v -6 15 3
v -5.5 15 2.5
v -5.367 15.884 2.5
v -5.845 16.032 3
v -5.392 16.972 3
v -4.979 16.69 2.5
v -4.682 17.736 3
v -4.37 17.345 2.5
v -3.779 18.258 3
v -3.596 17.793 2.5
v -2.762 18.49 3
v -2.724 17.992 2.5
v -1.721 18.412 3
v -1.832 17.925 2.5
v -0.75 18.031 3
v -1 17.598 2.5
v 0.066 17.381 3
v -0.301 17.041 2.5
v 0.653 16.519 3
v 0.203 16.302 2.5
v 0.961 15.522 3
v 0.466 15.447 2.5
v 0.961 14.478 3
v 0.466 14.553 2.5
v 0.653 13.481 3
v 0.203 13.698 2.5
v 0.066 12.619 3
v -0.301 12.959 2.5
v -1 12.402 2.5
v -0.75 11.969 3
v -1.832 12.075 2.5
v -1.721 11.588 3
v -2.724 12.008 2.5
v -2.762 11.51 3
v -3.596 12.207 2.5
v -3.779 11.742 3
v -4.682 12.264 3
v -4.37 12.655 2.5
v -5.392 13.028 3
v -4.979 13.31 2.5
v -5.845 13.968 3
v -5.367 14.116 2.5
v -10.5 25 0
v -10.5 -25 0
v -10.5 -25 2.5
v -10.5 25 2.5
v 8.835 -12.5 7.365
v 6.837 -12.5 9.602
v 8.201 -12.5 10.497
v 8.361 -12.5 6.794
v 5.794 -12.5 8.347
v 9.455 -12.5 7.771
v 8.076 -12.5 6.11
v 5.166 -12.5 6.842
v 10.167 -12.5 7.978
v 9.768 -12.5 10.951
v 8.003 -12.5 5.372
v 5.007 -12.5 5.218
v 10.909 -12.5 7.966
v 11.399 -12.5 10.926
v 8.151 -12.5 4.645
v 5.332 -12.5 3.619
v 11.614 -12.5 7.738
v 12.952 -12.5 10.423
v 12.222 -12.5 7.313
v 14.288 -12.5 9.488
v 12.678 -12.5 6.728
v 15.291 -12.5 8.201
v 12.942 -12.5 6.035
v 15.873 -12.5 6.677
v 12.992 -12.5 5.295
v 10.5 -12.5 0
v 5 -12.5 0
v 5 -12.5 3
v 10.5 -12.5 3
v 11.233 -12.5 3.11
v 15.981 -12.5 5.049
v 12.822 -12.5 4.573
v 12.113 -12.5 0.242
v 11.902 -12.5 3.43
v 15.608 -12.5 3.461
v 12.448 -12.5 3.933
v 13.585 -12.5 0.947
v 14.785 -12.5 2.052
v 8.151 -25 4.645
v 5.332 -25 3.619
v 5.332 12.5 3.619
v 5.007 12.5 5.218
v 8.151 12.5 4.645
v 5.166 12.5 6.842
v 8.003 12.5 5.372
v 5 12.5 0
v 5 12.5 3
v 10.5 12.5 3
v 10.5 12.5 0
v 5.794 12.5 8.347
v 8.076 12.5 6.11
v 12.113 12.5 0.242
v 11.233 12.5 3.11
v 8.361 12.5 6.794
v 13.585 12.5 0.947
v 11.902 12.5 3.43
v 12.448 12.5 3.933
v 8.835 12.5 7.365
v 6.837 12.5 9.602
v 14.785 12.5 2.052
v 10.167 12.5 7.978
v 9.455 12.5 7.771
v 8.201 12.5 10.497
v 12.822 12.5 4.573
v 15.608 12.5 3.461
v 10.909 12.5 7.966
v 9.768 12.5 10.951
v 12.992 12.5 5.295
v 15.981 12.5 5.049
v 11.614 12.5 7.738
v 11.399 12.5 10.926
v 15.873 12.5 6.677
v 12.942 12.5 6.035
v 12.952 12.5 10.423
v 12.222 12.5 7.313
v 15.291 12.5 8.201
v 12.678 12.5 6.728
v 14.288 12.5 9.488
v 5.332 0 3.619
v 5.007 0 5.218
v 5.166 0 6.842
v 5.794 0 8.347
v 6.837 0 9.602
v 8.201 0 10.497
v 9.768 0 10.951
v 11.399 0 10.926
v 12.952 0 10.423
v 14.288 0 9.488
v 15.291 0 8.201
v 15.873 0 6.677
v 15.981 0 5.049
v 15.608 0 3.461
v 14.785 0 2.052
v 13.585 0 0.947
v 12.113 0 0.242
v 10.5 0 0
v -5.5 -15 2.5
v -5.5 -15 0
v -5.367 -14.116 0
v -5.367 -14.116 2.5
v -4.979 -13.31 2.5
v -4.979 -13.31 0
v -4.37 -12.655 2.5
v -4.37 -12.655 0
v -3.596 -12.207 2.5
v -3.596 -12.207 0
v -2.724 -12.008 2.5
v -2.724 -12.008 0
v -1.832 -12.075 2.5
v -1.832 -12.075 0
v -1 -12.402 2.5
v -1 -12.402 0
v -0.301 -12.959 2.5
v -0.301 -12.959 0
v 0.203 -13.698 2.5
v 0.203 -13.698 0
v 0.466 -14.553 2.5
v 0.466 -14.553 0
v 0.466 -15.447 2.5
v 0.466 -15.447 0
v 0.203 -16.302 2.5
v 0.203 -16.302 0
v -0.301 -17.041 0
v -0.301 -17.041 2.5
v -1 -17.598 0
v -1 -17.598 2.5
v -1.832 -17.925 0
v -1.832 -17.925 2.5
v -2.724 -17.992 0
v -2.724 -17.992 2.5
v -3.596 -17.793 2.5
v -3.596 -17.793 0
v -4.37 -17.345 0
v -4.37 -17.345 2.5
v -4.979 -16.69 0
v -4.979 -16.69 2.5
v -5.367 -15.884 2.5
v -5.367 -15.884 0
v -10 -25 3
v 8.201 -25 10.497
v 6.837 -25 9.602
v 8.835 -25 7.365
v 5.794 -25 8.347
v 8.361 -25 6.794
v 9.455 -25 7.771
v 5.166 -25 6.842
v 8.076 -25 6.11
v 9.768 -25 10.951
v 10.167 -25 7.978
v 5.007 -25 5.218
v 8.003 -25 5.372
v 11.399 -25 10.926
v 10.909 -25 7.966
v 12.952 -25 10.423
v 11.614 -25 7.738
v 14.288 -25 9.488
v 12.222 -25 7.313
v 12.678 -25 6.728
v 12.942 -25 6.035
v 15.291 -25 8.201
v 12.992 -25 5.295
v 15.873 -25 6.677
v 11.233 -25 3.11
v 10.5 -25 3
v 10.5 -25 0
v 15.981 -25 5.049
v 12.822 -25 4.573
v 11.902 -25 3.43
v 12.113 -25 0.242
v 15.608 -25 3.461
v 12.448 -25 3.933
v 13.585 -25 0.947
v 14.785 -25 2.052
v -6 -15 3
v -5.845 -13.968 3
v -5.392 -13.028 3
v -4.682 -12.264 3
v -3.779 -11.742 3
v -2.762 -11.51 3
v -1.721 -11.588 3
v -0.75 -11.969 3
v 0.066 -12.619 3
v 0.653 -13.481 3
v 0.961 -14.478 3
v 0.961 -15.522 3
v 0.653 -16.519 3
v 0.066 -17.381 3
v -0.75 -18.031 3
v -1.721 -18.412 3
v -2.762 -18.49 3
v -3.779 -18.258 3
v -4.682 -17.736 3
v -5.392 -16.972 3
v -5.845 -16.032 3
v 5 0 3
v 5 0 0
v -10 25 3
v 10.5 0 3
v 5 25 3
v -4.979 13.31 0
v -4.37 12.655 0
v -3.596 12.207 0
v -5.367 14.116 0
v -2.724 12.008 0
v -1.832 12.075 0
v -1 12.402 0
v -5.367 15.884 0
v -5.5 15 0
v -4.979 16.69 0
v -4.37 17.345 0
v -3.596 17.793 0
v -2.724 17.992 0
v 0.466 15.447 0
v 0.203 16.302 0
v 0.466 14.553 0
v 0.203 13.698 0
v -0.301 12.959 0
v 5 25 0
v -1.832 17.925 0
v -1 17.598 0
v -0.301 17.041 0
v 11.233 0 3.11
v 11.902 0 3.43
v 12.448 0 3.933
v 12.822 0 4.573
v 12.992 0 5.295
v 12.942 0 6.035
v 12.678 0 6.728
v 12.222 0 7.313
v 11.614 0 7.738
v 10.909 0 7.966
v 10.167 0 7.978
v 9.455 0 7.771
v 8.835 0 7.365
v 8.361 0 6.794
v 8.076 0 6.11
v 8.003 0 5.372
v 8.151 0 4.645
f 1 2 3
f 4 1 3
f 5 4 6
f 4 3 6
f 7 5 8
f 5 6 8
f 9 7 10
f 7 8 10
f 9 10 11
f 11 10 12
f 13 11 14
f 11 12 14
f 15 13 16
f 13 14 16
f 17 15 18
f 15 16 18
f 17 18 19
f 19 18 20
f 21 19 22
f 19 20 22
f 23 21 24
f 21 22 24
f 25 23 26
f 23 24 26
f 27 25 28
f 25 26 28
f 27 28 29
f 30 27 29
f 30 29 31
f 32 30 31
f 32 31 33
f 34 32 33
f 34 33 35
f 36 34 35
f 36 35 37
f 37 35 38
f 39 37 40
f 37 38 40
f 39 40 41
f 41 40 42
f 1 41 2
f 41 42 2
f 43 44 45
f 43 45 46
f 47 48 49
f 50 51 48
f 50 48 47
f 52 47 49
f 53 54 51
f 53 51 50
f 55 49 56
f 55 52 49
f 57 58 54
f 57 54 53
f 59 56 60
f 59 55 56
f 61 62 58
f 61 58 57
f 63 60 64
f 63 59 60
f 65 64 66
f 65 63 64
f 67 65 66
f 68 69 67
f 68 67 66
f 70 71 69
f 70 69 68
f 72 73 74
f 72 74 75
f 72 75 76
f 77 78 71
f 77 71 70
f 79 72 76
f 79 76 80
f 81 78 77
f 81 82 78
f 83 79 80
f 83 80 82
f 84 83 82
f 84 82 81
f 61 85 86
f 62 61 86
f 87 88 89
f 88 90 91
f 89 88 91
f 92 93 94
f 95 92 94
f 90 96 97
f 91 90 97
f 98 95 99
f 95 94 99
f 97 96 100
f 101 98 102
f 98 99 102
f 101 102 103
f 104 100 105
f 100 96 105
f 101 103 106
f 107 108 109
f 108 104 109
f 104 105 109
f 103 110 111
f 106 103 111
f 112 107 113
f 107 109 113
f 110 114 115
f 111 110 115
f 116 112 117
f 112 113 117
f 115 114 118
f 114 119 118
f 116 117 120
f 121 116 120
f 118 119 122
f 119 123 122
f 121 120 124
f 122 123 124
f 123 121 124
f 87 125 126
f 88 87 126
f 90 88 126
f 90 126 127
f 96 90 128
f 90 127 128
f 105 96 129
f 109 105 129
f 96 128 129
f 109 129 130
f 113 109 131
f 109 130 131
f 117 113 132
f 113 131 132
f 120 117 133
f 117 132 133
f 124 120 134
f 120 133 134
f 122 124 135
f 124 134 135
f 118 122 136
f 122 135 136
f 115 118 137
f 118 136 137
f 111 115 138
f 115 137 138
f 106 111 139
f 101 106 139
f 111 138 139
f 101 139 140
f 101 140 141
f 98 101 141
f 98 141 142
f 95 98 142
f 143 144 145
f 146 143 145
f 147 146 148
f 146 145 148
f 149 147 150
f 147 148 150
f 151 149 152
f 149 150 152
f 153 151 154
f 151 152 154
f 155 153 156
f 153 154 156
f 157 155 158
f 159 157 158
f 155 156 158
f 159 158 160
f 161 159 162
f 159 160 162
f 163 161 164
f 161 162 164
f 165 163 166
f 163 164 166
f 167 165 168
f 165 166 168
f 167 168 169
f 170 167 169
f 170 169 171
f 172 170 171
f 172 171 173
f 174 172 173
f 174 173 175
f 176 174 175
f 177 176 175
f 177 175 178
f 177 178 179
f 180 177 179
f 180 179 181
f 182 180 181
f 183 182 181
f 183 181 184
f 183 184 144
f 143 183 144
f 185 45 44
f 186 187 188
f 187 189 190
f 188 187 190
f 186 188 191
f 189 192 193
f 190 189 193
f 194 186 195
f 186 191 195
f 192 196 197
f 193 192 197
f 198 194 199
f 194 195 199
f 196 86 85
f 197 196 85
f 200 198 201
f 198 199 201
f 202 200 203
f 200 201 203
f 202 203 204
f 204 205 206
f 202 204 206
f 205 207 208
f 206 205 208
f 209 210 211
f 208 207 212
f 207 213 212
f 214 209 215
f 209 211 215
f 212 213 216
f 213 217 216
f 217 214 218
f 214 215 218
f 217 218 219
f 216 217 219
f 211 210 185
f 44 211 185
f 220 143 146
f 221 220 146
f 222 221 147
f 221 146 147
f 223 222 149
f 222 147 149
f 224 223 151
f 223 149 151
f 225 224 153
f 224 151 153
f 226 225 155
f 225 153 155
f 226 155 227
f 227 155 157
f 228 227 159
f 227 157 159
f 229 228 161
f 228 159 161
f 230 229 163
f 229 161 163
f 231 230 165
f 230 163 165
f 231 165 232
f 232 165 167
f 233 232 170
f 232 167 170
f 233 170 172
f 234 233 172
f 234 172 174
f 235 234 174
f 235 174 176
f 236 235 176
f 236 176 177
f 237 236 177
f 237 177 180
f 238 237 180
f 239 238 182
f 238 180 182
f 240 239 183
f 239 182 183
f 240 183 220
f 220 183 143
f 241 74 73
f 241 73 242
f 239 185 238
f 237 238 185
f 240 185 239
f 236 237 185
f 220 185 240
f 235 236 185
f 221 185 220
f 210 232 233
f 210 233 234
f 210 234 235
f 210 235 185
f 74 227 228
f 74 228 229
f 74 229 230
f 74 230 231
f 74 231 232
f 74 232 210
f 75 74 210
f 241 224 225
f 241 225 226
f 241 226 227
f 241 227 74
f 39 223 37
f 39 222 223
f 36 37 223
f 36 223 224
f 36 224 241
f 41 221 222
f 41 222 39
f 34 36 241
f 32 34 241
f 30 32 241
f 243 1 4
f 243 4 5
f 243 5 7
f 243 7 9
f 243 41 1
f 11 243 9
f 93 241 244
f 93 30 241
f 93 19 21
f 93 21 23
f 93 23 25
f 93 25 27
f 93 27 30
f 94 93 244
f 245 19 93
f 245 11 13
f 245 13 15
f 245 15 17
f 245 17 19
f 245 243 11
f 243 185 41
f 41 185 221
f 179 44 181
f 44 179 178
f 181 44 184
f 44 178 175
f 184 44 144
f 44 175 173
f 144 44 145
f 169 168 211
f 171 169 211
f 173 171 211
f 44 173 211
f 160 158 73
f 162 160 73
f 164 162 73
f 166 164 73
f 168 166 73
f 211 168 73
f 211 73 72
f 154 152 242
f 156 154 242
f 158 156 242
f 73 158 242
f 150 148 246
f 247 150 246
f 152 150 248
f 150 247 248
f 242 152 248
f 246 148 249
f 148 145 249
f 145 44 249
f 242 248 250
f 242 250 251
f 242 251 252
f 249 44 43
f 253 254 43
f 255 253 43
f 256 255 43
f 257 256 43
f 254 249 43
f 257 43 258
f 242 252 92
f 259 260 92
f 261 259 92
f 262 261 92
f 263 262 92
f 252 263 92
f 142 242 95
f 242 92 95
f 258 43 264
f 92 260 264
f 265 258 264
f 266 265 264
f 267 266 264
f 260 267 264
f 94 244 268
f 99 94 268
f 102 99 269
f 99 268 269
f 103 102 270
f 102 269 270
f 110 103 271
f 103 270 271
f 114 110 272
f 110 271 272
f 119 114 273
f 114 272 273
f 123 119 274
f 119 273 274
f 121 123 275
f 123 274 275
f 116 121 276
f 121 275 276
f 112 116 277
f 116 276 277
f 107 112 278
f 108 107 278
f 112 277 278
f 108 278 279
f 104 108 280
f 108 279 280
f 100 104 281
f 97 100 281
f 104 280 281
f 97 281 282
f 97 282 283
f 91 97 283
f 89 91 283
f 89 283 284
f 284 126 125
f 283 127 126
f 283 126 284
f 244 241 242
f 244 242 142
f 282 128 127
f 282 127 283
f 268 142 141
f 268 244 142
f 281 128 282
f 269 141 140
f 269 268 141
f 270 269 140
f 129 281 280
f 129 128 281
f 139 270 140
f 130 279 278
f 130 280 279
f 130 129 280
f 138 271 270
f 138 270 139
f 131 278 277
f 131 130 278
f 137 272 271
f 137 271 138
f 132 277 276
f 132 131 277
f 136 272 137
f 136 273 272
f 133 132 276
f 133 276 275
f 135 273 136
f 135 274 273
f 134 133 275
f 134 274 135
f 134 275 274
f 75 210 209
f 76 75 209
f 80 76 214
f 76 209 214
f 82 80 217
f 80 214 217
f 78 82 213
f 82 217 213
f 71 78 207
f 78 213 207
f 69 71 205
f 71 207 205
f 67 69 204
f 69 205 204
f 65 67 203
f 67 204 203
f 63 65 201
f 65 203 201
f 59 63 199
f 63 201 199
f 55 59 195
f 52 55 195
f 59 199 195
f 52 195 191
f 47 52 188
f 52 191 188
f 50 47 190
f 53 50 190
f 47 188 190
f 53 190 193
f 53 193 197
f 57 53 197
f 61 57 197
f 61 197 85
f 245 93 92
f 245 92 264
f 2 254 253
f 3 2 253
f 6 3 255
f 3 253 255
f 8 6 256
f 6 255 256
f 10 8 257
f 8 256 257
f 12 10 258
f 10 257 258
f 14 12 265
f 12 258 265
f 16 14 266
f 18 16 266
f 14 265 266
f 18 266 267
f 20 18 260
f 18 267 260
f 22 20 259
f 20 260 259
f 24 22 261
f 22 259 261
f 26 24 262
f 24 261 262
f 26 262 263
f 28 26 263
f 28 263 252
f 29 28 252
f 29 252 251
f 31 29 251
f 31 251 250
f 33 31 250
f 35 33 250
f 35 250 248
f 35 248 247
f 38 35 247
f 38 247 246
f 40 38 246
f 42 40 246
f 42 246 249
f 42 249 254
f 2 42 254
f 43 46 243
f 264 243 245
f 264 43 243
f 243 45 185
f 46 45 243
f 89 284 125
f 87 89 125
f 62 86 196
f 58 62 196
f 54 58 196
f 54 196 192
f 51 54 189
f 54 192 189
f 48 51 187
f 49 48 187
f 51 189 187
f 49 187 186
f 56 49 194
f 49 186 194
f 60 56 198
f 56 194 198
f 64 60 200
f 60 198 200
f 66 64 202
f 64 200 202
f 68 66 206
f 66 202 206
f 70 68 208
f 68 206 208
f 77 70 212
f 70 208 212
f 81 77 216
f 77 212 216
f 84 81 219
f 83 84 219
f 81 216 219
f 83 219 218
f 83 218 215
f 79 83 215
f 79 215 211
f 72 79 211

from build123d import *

# Parameters (mm, degrees)
SKETCH1_W                    = 21
SKETCH1_H                    = 50
BASE_FLANGE1_DEPTH           = 3
HEM1_START                   = -25
HEM1_DEPTH                   = 12.5
LPATTERN1_COUNT              = 2
LPATTERN1_PITCH              = 25
SKETCH9_W                    = 5.5
SKETCH9_H                    = 12.5
CUT_EXTRUDE5_DEPTH           = 3
F_6_0_6_DIAMETER_HOLE1_D     = 6
F_6_0_6_DIAMETER_HOLE1_DEPTH = 8
F_6_0_6_DIAMETER_HOLE1_TIP   = 1.802581857
CHAMFER1_SIZE                = 0.5


# Read off the part's stored shape, not the designer's step: Hem1
# Sheet-metal steps are written as plain solids
with BuildPart() as part:
    # Sketch1 → Base-Flange1 (new body)
    with BuildSketch(Plane.XY):
        Rectangle(SKETCH1_W, SKETCH1_H)
    extrude(amount=BASE_FLANGE1_DEPTH)

    # Hem1 outline → Hem1 (add)
    with BuildSketch(Plane(origin=(0, 0, 0), x_dir=(1, 0, 0), z_dir=(0, 1, 0)).offset(HEM1_START)):
        with BuildLine():
            Line((8.150768448, -4.644949642), (5.331690586, -3.618889212))
            ThreePointArc((5.331690586, -3.618889212), (13.654670401, -10.005336243), (10.5, 0))
            Line((10.5, 0), (10.5, -3))
            ThreePointArc((10.5, -3), (11.933941091, -7.547880111), (8.150768448, -4.644949642))
        make_face()
    hem1 = extrude(amount=HEM1_DEPTH)

    # LPattern1: Hem1 ×2
    with Locations(*[(0, i * LPATTERN1_PITCH, 0) for i in range(1, LPATTERN1_COUNT)]):
        add(hem1)

    # Sketch9 → Cut-Extrude5 (cut)
    with BuildSketch(Plane.XY.offset(3)):
        with Locations((7.75, 18.75)):
            Rectangle(SKETCH9_W, SKETCH9_H)
        with Locations((7.75, -6.25)):
            Rectangle(SKETCH9_W, SKETCH9_H)
    extrude(amount=-CUT_EXTRUDE5_DEPTH, mode=Mode.SUBTRACT)

    # Ø6.0 (6) Diameter Hole1
    with Locations(Plane(origin=(-2.5, 15, 3), x_dir=(1, 0, 0), z_dir=(0, 0, 1))):
        with Locations((0, 0), (0, -30)):
            Hole(F_6_0_6_DIAMETER_HOLE1_D / 2, depth=F_6_0_6_DIAMETER_HOLE1_DEPTH)
            with Locations((0, 0, -(F_6_0_6_DIAMETER_HOLE1_DEPTH + F_6_0_6_DIAMETER_HOLE1_TIP / 2))):  # 118° drill point
                Cone(0, F_6_0_6_DIAMETER_HOLE1_D / 2, F_6_0_6_DIAMETER_HOLE1_TIP, mode=Mode.SUBTRACT)

    # Chamfer1
    chamfer1_edges = [part.edges().sort_by_distance(p)[0] for p in [
        (-10.5, 0, 3),
        (0.5, -15, 3),
        (0.5, 15, 3),
    ]]
    chamfer(chamfer1_edges, length=CHAMFER1_SIZE)


solid = part.part
